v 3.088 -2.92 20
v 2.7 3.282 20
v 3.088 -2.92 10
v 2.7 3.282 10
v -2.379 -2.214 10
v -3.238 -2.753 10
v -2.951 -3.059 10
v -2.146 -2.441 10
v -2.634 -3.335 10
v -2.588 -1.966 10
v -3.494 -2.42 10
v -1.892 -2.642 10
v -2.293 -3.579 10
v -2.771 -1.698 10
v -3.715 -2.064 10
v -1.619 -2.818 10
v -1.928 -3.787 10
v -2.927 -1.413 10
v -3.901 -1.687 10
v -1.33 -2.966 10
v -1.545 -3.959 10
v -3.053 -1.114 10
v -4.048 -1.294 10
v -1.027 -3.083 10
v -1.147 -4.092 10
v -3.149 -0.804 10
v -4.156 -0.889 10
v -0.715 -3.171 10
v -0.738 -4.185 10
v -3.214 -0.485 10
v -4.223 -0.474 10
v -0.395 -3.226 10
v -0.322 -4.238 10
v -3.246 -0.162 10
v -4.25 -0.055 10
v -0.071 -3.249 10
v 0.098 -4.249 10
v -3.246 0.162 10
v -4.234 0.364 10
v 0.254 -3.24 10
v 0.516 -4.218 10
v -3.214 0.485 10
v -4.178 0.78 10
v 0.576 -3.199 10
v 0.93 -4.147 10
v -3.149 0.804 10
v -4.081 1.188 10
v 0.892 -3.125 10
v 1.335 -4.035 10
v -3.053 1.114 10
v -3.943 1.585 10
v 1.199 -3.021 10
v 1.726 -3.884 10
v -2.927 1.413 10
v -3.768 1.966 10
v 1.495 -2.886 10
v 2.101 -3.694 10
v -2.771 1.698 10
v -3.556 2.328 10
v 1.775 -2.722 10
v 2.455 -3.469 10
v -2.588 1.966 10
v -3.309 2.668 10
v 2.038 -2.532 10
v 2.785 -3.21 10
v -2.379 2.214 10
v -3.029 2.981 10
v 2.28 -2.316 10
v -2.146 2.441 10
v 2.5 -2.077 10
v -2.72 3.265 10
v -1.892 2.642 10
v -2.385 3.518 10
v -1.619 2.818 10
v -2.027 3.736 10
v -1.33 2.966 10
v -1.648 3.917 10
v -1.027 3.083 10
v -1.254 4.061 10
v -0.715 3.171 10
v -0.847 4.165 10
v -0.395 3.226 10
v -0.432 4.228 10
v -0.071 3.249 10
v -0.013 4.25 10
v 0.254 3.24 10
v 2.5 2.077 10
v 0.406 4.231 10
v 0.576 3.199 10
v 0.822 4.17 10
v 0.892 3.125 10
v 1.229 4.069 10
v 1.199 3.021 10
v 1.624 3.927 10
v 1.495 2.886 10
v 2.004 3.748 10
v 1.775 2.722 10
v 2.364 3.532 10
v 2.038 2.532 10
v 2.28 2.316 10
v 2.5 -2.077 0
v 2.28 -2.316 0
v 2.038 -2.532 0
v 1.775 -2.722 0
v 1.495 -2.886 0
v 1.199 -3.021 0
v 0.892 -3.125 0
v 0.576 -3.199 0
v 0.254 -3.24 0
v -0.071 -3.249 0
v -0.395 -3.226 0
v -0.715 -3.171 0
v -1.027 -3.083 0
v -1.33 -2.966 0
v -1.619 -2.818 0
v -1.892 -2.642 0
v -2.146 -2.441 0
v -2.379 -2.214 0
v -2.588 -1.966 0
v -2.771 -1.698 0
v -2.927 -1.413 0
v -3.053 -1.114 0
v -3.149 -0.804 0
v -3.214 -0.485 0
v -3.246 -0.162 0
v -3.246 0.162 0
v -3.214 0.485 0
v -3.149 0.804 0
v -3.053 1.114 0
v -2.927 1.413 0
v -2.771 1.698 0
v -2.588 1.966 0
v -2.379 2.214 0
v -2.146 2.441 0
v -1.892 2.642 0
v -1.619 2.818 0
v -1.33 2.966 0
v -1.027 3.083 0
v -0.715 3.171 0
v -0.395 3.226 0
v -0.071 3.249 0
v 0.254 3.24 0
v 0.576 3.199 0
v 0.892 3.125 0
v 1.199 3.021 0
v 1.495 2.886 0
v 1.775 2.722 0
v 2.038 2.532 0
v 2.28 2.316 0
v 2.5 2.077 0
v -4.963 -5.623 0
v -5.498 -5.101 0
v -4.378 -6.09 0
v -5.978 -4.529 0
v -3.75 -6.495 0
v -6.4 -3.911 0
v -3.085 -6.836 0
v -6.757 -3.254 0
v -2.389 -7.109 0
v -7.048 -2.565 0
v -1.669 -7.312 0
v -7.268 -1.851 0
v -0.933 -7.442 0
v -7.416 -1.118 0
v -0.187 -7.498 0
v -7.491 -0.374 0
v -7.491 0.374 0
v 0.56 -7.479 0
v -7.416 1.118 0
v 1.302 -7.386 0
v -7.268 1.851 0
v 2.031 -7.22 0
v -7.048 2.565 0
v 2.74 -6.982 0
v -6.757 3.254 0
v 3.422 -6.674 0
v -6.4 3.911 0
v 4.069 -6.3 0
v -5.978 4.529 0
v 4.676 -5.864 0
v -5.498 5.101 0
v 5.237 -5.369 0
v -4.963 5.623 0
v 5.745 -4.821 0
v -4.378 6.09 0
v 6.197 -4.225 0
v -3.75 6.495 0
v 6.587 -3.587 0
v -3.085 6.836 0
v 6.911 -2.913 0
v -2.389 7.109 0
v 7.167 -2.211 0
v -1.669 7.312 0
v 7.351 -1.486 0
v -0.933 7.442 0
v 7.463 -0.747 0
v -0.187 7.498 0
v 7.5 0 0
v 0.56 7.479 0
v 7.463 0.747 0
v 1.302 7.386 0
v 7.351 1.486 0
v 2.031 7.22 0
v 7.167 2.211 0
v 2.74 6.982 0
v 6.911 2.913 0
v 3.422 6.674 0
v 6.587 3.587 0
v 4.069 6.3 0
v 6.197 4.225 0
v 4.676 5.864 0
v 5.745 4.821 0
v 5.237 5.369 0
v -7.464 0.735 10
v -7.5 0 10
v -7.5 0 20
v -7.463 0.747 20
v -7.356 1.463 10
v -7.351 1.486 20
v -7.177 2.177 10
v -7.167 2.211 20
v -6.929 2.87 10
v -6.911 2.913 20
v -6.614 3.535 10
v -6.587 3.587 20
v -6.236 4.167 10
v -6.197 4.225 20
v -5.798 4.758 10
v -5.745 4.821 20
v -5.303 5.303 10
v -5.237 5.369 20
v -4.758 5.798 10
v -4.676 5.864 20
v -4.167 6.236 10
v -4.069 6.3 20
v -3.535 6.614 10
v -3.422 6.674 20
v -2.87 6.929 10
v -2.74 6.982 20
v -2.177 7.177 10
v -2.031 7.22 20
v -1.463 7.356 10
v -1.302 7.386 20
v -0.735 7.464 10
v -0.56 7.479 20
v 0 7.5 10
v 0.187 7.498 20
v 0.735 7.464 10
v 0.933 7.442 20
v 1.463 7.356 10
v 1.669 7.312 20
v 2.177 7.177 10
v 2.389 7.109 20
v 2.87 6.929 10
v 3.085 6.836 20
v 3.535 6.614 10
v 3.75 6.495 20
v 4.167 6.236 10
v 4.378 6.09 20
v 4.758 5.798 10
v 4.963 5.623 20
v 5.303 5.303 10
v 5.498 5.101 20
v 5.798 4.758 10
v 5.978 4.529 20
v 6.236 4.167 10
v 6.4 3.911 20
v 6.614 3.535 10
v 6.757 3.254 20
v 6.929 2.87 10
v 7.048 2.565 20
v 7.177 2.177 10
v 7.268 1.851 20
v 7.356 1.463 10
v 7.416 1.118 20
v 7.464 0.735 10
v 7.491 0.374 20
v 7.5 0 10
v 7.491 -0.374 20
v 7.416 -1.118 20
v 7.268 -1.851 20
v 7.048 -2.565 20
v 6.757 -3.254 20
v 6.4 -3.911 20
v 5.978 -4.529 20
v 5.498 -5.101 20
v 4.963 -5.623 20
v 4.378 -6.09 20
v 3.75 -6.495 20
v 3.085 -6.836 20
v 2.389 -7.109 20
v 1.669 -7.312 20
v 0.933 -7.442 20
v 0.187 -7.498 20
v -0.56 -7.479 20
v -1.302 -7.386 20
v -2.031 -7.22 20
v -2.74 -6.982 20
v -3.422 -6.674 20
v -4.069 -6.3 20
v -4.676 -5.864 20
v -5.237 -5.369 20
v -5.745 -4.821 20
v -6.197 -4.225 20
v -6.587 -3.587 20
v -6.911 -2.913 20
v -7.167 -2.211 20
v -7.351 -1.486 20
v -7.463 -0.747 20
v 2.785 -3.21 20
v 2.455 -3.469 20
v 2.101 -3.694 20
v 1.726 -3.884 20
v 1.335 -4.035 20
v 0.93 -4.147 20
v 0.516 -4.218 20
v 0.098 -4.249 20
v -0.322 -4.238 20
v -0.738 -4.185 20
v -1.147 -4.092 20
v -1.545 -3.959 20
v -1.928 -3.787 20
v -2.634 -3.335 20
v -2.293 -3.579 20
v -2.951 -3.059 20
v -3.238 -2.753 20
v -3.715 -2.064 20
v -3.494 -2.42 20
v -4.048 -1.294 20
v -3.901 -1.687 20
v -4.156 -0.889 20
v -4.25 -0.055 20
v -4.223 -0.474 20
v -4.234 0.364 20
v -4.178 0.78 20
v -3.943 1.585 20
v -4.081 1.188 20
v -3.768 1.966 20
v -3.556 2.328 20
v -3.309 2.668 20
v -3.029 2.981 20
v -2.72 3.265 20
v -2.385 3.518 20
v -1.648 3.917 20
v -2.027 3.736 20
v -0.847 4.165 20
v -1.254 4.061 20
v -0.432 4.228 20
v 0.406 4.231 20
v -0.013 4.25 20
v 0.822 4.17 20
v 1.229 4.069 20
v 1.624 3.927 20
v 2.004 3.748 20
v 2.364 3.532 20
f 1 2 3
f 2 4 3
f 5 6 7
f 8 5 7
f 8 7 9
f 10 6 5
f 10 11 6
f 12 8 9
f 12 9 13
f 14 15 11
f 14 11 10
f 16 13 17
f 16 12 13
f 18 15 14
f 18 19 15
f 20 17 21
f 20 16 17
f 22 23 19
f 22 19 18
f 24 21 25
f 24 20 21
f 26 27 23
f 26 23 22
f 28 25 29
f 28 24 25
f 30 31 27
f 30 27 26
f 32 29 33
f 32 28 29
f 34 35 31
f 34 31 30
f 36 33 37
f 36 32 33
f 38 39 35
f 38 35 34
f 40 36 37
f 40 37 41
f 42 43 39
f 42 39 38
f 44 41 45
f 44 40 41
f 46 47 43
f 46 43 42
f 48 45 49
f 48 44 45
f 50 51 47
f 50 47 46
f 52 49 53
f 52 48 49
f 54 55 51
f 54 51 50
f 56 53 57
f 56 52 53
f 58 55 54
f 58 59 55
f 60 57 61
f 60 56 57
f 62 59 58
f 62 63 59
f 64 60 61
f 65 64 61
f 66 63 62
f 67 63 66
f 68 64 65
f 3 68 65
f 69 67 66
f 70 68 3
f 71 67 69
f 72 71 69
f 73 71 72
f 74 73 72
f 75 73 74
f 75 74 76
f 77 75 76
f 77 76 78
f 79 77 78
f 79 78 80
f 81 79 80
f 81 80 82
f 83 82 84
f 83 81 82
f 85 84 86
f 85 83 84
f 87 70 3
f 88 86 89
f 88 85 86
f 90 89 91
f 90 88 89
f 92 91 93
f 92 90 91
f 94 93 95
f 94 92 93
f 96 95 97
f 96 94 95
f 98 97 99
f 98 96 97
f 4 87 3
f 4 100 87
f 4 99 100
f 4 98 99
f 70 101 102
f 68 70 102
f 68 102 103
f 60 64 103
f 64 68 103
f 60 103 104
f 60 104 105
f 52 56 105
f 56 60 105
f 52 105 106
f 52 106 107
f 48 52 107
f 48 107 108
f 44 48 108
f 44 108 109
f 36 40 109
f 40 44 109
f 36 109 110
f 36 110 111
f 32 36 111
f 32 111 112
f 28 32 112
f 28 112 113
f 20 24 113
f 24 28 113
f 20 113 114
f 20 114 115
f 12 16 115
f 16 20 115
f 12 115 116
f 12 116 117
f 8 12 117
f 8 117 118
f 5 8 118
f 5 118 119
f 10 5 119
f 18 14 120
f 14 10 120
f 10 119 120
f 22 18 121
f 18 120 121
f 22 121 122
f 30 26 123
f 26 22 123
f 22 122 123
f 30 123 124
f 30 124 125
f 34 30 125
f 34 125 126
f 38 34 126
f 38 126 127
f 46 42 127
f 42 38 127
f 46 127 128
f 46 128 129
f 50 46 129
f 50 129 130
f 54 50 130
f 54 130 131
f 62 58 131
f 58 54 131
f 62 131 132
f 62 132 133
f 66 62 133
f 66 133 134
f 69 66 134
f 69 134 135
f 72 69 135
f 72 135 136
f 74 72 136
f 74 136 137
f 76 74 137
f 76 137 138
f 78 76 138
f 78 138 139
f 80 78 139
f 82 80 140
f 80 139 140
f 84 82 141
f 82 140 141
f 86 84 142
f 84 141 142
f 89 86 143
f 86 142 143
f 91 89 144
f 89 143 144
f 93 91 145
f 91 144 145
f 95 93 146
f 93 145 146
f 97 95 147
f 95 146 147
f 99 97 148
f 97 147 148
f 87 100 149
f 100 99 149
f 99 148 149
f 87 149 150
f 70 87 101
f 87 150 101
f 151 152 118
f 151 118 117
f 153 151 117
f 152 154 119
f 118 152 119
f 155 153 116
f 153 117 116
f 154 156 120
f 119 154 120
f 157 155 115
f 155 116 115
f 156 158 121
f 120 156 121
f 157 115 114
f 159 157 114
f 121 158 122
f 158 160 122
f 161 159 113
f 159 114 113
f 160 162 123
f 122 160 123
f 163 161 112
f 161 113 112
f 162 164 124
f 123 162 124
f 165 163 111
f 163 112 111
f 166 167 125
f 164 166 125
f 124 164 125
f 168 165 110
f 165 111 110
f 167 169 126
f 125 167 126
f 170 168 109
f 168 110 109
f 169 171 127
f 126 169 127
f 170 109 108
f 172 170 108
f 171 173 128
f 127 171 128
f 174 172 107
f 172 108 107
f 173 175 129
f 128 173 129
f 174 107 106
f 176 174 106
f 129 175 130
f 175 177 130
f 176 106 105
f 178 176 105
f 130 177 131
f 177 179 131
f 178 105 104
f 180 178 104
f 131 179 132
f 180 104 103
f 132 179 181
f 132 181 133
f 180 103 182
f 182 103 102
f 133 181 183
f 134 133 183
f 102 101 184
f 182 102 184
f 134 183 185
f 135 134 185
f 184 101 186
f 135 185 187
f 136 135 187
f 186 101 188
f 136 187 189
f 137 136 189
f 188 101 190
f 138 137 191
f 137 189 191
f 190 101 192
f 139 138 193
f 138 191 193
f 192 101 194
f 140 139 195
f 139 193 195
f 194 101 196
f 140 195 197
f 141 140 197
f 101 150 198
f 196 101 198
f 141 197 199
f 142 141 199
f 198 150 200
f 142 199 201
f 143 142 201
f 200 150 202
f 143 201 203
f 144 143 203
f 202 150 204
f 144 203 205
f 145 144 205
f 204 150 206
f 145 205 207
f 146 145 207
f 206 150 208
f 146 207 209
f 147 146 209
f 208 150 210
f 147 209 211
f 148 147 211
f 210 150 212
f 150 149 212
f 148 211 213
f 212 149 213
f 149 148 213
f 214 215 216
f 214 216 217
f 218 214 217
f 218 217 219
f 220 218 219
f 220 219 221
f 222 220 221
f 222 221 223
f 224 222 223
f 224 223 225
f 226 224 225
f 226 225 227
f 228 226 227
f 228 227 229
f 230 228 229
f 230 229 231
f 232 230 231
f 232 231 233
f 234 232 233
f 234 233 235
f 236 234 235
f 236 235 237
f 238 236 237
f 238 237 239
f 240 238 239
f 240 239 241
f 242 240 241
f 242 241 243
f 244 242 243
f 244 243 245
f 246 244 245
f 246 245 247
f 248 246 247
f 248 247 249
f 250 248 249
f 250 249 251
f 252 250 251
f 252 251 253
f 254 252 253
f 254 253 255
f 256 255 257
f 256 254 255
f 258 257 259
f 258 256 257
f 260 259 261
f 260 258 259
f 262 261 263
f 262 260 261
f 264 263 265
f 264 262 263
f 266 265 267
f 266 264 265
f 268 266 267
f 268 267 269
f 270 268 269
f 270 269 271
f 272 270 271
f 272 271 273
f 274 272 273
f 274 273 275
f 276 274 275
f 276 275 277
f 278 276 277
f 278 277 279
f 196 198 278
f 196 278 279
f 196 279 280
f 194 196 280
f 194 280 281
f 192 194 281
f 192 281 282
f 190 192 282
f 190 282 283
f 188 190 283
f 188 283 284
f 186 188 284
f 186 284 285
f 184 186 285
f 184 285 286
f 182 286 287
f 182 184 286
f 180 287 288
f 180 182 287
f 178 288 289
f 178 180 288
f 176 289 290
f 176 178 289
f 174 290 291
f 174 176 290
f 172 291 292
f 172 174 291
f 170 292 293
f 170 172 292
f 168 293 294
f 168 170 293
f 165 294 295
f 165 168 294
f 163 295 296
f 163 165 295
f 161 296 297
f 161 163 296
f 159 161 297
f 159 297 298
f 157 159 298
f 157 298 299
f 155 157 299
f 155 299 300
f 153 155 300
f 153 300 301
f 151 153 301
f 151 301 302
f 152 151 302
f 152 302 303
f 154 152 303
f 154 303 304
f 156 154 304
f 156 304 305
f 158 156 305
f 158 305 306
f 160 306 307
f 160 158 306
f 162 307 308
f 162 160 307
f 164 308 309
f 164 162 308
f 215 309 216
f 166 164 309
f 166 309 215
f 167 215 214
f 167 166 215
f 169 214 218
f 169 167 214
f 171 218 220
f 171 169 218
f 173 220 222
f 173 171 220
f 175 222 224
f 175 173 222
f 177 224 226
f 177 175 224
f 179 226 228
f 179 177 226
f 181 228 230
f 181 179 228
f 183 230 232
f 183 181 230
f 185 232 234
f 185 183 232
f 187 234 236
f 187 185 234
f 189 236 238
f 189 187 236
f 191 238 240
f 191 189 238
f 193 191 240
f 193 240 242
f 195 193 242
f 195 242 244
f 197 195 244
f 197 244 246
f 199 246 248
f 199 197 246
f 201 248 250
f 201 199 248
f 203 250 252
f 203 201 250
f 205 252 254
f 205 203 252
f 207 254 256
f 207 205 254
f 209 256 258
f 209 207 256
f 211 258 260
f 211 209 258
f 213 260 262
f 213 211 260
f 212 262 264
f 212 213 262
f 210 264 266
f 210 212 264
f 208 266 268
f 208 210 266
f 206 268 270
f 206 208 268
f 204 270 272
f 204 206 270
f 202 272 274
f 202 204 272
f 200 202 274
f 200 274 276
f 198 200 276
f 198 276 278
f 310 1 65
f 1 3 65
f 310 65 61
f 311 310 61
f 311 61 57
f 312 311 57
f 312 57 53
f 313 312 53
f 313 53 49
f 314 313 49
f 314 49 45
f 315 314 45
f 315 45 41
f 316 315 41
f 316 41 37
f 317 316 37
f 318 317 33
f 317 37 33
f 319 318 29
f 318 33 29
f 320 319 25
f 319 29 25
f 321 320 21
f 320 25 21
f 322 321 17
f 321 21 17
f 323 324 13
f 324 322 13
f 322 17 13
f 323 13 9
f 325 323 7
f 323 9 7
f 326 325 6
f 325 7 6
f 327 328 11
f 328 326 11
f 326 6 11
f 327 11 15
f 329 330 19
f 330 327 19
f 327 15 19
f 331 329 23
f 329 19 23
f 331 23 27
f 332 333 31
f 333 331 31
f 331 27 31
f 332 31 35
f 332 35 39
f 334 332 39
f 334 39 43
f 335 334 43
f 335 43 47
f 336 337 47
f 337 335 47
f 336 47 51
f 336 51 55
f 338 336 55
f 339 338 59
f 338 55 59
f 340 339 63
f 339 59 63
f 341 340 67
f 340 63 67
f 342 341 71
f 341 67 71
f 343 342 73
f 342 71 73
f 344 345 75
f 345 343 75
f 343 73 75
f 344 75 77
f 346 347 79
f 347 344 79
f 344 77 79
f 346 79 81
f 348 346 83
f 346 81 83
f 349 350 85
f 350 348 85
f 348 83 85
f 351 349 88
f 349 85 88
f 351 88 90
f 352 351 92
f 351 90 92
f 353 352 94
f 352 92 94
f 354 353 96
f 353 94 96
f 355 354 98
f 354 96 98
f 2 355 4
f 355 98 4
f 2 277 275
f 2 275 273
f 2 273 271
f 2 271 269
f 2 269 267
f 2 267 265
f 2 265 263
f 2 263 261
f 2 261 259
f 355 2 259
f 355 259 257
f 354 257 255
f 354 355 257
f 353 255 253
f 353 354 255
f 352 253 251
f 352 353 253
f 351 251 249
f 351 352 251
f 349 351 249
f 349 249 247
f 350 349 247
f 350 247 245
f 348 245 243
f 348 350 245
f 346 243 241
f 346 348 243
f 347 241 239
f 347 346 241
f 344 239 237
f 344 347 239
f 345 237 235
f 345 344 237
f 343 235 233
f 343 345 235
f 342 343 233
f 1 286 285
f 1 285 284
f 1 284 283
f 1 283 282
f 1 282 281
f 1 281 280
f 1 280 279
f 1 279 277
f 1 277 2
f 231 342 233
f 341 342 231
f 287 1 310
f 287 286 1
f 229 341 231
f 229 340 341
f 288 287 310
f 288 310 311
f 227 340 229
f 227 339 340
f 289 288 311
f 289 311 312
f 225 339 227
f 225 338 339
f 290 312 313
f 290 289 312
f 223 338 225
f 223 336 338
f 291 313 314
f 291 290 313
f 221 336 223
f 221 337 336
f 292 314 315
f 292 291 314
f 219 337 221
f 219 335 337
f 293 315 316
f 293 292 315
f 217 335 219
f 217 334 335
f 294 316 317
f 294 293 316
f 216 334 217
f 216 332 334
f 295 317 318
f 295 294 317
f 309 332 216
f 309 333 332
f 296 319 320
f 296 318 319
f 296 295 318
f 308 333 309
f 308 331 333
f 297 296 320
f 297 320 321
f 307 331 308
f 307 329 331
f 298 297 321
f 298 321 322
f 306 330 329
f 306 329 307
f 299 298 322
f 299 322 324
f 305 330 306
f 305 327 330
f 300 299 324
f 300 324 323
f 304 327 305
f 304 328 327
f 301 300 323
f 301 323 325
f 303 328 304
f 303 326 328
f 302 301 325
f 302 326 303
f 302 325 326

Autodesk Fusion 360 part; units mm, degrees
sketch "Sketch5" plane through (0, 0, 0) normal (0, 0, 1) x (1, 0, 0)
  circle A0 centre (0, 0) radius 7.5
  line L0 (2.5, 2.0767) -> (2.5, -2.0767)
  arc A1 (2.5, 2.0767) -> (2.5, -2.0767) centre (0, 0) ccw
  dimension "d22" = 15
  dimension "d29" = 6.5
  dimension "d30" = 2.5
extrude "Extrude5" add sketch "Sketch5" along normal blind 10
sketch "Sketch6" plane through (0, 0, 10) normal (0, 0, 1) x (-1, 0, 0)
  circle A0 centre (0, 0) radius 7.5
  circle A1 centre (0, 0) radius 7.5
  arc A2 (-2.5, -2.0767) -> (-2.5, 2.0767) centre (0, 0) ccw
  line L0 (-2.5, -2.0767) -> (-2.5, 2.0767)
  line L1 (-2.7005, -3.2818) -> (-3.0882, 2.9198)
  arc A3 (-2.7005, -3.2818) -> (-3.0882, 2.9198) centre (0, 0) ccw
  dimension "d31" = 8.5
  dimension "d32" = 2.9
extrude "Extrude6" add sketch "Sketch6" along normal blind 10 contours A0 A1
